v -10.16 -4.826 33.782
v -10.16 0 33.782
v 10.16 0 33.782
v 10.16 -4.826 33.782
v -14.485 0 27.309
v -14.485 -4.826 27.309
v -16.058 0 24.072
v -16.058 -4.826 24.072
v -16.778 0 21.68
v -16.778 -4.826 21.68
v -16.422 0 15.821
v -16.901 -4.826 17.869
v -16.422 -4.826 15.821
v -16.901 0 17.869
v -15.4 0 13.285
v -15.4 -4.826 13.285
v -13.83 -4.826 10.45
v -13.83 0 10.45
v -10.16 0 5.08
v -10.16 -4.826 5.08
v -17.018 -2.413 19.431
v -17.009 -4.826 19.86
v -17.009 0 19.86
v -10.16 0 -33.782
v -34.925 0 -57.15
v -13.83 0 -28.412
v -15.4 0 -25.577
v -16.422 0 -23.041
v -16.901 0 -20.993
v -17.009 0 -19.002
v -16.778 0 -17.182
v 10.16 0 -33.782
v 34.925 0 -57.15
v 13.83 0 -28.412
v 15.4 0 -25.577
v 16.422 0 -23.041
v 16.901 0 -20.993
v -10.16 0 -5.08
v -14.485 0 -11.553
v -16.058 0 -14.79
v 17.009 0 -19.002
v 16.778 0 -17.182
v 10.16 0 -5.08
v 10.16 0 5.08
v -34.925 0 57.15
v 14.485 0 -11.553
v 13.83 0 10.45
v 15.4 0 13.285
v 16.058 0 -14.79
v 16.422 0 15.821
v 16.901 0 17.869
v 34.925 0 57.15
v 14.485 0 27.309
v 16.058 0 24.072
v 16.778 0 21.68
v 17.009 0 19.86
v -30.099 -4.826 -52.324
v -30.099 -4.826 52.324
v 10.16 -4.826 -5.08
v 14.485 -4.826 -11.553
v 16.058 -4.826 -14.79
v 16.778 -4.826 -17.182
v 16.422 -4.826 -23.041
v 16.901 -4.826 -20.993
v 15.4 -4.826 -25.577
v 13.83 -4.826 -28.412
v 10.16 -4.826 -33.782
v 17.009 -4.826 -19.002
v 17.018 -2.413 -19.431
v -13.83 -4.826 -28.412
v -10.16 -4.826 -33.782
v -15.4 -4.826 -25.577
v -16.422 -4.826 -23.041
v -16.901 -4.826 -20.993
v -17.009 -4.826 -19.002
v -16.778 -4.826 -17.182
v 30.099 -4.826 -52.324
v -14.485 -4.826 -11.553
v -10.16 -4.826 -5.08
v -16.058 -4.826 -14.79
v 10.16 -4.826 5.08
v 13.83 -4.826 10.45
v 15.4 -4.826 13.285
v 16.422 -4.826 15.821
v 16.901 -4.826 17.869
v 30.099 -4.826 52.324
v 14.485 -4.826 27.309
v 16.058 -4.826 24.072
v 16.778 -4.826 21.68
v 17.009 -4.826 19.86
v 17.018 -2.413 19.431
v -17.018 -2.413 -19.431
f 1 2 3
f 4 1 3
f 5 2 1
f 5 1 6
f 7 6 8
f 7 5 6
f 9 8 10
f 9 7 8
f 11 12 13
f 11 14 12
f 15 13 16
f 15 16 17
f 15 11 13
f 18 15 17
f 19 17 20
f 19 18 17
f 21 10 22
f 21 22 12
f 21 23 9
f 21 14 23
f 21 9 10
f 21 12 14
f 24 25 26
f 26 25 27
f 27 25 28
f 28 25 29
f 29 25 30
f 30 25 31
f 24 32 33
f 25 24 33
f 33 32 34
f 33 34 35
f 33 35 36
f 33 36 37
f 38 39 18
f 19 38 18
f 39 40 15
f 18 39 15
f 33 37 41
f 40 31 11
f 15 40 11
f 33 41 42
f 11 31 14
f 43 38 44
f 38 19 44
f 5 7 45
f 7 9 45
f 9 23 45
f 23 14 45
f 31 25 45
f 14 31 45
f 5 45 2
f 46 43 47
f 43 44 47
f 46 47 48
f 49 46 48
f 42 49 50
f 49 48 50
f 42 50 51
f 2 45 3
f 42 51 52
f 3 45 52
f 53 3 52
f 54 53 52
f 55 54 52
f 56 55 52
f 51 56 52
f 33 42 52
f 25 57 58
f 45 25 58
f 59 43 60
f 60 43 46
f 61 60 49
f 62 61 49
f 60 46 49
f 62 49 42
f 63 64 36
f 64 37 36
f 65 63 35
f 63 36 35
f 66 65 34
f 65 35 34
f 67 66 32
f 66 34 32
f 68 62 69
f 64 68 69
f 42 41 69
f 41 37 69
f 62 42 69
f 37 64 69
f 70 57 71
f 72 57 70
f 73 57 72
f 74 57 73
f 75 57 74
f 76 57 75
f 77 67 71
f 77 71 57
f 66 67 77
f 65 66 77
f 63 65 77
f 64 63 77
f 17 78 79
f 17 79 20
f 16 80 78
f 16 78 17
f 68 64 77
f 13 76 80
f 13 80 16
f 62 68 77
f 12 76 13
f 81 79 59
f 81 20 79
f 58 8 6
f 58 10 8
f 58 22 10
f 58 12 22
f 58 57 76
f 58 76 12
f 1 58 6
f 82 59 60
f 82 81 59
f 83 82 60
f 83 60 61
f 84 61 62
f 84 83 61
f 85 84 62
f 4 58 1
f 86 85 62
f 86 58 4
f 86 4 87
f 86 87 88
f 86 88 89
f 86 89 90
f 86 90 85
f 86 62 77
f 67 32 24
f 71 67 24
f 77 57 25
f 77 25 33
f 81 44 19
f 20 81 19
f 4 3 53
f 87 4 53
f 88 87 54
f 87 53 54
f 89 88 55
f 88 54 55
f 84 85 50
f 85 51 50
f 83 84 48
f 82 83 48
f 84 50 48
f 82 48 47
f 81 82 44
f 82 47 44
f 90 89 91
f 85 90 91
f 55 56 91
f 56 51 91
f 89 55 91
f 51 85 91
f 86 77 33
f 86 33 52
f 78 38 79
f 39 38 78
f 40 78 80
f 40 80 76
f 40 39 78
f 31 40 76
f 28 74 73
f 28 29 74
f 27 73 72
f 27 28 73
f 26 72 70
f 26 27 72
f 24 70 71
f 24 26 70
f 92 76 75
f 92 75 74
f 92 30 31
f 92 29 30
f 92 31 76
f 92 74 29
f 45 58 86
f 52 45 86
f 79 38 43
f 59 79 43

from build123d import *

# Parameters (mm, degrees)
F0_W     = 69.85
F0_H     = 114.3
F1_DEPTH = 4.826
F2_SIZE  = 4.82599


# Not quite as in the source:
# - a fillet or chamfer is up to 0.001 mm smaller than in the source, because OpenCascade refuses the exact size


with BuildPart() as f1:
    # F0 (on Front) → F1 (new body)
    with BuildSketch(Plane.XZ):
        Rectangle(F0_W, F0_H)
        with BuildLine():
            add(Edge.make_bspline(
                [(-10.16, -5.08), (-13.589, -9.8636666667), (-20.447, -19.431), (-13.589, -28.9983333333), (-10.16, -33.782)],
                knots=[0, 0, 0, 0, 0.5, 1, 1, 1, 1], degree=3))
            Line((-10.16, -5.08), (10.16, -5.08))
            add(Edge.make_bspline(
                [(10.16, -5.08), (13.589, -9.8636666667), (20.447, -19.431), (13.589, -28.9983333333), (10.16, -33.782)],
                knots=[0, 0, 0, 0, 0.5, 1, 1, 1, 1], degree=3))
            Line((10.16, -33.782), (-10.16, -33.782))
        make_face(mode=Mode.SUBTRACT)
        with BuildLine():
            add(Edge.make_bspline(
                [(-10.16, 33.782), (-13.589, 28.9983333333), (-20.447, 19.431), (-13.589, 9.8636666667), (-10.16, 5.08)],
                knots=[0, 0, 0, 0, 0.5, 1, 1, 1, 1], degree=3))
            Line((-10.16, 33.782), (10.16, 33.782))
            add(Edge.make_bspline(
                [(10.16, 33.782), (13.589, 28.9983333333), (20.447, 19.431), (13.589, 9.8636666667), (10.16, 5.08)],
                knots=[0, 0, 0, 0, 0.5, 1, 1, 1, 1], degree=3))
            Line((10.16, 5.08), (-10.16, 5.08))
        make_face(mode=Mode.SUBTRACT)
    extrude(amount=F1_DEPTH)

    # F2 (size 4.826 in the source; OpenCascade refuses exactly that, so slightly less here)
    f2_edges = [f1.edges().sort_by_distance(p)[0] for p in [
        (-34.925, -4.826, 0),
        (0, -4.826, 57.15),
        (34.925, -4.826, 0),
        (0, -4.826, -57.15),
    ]]
    chamfer(f2_edges, length=F2_SIZE)


solid = f1.part
